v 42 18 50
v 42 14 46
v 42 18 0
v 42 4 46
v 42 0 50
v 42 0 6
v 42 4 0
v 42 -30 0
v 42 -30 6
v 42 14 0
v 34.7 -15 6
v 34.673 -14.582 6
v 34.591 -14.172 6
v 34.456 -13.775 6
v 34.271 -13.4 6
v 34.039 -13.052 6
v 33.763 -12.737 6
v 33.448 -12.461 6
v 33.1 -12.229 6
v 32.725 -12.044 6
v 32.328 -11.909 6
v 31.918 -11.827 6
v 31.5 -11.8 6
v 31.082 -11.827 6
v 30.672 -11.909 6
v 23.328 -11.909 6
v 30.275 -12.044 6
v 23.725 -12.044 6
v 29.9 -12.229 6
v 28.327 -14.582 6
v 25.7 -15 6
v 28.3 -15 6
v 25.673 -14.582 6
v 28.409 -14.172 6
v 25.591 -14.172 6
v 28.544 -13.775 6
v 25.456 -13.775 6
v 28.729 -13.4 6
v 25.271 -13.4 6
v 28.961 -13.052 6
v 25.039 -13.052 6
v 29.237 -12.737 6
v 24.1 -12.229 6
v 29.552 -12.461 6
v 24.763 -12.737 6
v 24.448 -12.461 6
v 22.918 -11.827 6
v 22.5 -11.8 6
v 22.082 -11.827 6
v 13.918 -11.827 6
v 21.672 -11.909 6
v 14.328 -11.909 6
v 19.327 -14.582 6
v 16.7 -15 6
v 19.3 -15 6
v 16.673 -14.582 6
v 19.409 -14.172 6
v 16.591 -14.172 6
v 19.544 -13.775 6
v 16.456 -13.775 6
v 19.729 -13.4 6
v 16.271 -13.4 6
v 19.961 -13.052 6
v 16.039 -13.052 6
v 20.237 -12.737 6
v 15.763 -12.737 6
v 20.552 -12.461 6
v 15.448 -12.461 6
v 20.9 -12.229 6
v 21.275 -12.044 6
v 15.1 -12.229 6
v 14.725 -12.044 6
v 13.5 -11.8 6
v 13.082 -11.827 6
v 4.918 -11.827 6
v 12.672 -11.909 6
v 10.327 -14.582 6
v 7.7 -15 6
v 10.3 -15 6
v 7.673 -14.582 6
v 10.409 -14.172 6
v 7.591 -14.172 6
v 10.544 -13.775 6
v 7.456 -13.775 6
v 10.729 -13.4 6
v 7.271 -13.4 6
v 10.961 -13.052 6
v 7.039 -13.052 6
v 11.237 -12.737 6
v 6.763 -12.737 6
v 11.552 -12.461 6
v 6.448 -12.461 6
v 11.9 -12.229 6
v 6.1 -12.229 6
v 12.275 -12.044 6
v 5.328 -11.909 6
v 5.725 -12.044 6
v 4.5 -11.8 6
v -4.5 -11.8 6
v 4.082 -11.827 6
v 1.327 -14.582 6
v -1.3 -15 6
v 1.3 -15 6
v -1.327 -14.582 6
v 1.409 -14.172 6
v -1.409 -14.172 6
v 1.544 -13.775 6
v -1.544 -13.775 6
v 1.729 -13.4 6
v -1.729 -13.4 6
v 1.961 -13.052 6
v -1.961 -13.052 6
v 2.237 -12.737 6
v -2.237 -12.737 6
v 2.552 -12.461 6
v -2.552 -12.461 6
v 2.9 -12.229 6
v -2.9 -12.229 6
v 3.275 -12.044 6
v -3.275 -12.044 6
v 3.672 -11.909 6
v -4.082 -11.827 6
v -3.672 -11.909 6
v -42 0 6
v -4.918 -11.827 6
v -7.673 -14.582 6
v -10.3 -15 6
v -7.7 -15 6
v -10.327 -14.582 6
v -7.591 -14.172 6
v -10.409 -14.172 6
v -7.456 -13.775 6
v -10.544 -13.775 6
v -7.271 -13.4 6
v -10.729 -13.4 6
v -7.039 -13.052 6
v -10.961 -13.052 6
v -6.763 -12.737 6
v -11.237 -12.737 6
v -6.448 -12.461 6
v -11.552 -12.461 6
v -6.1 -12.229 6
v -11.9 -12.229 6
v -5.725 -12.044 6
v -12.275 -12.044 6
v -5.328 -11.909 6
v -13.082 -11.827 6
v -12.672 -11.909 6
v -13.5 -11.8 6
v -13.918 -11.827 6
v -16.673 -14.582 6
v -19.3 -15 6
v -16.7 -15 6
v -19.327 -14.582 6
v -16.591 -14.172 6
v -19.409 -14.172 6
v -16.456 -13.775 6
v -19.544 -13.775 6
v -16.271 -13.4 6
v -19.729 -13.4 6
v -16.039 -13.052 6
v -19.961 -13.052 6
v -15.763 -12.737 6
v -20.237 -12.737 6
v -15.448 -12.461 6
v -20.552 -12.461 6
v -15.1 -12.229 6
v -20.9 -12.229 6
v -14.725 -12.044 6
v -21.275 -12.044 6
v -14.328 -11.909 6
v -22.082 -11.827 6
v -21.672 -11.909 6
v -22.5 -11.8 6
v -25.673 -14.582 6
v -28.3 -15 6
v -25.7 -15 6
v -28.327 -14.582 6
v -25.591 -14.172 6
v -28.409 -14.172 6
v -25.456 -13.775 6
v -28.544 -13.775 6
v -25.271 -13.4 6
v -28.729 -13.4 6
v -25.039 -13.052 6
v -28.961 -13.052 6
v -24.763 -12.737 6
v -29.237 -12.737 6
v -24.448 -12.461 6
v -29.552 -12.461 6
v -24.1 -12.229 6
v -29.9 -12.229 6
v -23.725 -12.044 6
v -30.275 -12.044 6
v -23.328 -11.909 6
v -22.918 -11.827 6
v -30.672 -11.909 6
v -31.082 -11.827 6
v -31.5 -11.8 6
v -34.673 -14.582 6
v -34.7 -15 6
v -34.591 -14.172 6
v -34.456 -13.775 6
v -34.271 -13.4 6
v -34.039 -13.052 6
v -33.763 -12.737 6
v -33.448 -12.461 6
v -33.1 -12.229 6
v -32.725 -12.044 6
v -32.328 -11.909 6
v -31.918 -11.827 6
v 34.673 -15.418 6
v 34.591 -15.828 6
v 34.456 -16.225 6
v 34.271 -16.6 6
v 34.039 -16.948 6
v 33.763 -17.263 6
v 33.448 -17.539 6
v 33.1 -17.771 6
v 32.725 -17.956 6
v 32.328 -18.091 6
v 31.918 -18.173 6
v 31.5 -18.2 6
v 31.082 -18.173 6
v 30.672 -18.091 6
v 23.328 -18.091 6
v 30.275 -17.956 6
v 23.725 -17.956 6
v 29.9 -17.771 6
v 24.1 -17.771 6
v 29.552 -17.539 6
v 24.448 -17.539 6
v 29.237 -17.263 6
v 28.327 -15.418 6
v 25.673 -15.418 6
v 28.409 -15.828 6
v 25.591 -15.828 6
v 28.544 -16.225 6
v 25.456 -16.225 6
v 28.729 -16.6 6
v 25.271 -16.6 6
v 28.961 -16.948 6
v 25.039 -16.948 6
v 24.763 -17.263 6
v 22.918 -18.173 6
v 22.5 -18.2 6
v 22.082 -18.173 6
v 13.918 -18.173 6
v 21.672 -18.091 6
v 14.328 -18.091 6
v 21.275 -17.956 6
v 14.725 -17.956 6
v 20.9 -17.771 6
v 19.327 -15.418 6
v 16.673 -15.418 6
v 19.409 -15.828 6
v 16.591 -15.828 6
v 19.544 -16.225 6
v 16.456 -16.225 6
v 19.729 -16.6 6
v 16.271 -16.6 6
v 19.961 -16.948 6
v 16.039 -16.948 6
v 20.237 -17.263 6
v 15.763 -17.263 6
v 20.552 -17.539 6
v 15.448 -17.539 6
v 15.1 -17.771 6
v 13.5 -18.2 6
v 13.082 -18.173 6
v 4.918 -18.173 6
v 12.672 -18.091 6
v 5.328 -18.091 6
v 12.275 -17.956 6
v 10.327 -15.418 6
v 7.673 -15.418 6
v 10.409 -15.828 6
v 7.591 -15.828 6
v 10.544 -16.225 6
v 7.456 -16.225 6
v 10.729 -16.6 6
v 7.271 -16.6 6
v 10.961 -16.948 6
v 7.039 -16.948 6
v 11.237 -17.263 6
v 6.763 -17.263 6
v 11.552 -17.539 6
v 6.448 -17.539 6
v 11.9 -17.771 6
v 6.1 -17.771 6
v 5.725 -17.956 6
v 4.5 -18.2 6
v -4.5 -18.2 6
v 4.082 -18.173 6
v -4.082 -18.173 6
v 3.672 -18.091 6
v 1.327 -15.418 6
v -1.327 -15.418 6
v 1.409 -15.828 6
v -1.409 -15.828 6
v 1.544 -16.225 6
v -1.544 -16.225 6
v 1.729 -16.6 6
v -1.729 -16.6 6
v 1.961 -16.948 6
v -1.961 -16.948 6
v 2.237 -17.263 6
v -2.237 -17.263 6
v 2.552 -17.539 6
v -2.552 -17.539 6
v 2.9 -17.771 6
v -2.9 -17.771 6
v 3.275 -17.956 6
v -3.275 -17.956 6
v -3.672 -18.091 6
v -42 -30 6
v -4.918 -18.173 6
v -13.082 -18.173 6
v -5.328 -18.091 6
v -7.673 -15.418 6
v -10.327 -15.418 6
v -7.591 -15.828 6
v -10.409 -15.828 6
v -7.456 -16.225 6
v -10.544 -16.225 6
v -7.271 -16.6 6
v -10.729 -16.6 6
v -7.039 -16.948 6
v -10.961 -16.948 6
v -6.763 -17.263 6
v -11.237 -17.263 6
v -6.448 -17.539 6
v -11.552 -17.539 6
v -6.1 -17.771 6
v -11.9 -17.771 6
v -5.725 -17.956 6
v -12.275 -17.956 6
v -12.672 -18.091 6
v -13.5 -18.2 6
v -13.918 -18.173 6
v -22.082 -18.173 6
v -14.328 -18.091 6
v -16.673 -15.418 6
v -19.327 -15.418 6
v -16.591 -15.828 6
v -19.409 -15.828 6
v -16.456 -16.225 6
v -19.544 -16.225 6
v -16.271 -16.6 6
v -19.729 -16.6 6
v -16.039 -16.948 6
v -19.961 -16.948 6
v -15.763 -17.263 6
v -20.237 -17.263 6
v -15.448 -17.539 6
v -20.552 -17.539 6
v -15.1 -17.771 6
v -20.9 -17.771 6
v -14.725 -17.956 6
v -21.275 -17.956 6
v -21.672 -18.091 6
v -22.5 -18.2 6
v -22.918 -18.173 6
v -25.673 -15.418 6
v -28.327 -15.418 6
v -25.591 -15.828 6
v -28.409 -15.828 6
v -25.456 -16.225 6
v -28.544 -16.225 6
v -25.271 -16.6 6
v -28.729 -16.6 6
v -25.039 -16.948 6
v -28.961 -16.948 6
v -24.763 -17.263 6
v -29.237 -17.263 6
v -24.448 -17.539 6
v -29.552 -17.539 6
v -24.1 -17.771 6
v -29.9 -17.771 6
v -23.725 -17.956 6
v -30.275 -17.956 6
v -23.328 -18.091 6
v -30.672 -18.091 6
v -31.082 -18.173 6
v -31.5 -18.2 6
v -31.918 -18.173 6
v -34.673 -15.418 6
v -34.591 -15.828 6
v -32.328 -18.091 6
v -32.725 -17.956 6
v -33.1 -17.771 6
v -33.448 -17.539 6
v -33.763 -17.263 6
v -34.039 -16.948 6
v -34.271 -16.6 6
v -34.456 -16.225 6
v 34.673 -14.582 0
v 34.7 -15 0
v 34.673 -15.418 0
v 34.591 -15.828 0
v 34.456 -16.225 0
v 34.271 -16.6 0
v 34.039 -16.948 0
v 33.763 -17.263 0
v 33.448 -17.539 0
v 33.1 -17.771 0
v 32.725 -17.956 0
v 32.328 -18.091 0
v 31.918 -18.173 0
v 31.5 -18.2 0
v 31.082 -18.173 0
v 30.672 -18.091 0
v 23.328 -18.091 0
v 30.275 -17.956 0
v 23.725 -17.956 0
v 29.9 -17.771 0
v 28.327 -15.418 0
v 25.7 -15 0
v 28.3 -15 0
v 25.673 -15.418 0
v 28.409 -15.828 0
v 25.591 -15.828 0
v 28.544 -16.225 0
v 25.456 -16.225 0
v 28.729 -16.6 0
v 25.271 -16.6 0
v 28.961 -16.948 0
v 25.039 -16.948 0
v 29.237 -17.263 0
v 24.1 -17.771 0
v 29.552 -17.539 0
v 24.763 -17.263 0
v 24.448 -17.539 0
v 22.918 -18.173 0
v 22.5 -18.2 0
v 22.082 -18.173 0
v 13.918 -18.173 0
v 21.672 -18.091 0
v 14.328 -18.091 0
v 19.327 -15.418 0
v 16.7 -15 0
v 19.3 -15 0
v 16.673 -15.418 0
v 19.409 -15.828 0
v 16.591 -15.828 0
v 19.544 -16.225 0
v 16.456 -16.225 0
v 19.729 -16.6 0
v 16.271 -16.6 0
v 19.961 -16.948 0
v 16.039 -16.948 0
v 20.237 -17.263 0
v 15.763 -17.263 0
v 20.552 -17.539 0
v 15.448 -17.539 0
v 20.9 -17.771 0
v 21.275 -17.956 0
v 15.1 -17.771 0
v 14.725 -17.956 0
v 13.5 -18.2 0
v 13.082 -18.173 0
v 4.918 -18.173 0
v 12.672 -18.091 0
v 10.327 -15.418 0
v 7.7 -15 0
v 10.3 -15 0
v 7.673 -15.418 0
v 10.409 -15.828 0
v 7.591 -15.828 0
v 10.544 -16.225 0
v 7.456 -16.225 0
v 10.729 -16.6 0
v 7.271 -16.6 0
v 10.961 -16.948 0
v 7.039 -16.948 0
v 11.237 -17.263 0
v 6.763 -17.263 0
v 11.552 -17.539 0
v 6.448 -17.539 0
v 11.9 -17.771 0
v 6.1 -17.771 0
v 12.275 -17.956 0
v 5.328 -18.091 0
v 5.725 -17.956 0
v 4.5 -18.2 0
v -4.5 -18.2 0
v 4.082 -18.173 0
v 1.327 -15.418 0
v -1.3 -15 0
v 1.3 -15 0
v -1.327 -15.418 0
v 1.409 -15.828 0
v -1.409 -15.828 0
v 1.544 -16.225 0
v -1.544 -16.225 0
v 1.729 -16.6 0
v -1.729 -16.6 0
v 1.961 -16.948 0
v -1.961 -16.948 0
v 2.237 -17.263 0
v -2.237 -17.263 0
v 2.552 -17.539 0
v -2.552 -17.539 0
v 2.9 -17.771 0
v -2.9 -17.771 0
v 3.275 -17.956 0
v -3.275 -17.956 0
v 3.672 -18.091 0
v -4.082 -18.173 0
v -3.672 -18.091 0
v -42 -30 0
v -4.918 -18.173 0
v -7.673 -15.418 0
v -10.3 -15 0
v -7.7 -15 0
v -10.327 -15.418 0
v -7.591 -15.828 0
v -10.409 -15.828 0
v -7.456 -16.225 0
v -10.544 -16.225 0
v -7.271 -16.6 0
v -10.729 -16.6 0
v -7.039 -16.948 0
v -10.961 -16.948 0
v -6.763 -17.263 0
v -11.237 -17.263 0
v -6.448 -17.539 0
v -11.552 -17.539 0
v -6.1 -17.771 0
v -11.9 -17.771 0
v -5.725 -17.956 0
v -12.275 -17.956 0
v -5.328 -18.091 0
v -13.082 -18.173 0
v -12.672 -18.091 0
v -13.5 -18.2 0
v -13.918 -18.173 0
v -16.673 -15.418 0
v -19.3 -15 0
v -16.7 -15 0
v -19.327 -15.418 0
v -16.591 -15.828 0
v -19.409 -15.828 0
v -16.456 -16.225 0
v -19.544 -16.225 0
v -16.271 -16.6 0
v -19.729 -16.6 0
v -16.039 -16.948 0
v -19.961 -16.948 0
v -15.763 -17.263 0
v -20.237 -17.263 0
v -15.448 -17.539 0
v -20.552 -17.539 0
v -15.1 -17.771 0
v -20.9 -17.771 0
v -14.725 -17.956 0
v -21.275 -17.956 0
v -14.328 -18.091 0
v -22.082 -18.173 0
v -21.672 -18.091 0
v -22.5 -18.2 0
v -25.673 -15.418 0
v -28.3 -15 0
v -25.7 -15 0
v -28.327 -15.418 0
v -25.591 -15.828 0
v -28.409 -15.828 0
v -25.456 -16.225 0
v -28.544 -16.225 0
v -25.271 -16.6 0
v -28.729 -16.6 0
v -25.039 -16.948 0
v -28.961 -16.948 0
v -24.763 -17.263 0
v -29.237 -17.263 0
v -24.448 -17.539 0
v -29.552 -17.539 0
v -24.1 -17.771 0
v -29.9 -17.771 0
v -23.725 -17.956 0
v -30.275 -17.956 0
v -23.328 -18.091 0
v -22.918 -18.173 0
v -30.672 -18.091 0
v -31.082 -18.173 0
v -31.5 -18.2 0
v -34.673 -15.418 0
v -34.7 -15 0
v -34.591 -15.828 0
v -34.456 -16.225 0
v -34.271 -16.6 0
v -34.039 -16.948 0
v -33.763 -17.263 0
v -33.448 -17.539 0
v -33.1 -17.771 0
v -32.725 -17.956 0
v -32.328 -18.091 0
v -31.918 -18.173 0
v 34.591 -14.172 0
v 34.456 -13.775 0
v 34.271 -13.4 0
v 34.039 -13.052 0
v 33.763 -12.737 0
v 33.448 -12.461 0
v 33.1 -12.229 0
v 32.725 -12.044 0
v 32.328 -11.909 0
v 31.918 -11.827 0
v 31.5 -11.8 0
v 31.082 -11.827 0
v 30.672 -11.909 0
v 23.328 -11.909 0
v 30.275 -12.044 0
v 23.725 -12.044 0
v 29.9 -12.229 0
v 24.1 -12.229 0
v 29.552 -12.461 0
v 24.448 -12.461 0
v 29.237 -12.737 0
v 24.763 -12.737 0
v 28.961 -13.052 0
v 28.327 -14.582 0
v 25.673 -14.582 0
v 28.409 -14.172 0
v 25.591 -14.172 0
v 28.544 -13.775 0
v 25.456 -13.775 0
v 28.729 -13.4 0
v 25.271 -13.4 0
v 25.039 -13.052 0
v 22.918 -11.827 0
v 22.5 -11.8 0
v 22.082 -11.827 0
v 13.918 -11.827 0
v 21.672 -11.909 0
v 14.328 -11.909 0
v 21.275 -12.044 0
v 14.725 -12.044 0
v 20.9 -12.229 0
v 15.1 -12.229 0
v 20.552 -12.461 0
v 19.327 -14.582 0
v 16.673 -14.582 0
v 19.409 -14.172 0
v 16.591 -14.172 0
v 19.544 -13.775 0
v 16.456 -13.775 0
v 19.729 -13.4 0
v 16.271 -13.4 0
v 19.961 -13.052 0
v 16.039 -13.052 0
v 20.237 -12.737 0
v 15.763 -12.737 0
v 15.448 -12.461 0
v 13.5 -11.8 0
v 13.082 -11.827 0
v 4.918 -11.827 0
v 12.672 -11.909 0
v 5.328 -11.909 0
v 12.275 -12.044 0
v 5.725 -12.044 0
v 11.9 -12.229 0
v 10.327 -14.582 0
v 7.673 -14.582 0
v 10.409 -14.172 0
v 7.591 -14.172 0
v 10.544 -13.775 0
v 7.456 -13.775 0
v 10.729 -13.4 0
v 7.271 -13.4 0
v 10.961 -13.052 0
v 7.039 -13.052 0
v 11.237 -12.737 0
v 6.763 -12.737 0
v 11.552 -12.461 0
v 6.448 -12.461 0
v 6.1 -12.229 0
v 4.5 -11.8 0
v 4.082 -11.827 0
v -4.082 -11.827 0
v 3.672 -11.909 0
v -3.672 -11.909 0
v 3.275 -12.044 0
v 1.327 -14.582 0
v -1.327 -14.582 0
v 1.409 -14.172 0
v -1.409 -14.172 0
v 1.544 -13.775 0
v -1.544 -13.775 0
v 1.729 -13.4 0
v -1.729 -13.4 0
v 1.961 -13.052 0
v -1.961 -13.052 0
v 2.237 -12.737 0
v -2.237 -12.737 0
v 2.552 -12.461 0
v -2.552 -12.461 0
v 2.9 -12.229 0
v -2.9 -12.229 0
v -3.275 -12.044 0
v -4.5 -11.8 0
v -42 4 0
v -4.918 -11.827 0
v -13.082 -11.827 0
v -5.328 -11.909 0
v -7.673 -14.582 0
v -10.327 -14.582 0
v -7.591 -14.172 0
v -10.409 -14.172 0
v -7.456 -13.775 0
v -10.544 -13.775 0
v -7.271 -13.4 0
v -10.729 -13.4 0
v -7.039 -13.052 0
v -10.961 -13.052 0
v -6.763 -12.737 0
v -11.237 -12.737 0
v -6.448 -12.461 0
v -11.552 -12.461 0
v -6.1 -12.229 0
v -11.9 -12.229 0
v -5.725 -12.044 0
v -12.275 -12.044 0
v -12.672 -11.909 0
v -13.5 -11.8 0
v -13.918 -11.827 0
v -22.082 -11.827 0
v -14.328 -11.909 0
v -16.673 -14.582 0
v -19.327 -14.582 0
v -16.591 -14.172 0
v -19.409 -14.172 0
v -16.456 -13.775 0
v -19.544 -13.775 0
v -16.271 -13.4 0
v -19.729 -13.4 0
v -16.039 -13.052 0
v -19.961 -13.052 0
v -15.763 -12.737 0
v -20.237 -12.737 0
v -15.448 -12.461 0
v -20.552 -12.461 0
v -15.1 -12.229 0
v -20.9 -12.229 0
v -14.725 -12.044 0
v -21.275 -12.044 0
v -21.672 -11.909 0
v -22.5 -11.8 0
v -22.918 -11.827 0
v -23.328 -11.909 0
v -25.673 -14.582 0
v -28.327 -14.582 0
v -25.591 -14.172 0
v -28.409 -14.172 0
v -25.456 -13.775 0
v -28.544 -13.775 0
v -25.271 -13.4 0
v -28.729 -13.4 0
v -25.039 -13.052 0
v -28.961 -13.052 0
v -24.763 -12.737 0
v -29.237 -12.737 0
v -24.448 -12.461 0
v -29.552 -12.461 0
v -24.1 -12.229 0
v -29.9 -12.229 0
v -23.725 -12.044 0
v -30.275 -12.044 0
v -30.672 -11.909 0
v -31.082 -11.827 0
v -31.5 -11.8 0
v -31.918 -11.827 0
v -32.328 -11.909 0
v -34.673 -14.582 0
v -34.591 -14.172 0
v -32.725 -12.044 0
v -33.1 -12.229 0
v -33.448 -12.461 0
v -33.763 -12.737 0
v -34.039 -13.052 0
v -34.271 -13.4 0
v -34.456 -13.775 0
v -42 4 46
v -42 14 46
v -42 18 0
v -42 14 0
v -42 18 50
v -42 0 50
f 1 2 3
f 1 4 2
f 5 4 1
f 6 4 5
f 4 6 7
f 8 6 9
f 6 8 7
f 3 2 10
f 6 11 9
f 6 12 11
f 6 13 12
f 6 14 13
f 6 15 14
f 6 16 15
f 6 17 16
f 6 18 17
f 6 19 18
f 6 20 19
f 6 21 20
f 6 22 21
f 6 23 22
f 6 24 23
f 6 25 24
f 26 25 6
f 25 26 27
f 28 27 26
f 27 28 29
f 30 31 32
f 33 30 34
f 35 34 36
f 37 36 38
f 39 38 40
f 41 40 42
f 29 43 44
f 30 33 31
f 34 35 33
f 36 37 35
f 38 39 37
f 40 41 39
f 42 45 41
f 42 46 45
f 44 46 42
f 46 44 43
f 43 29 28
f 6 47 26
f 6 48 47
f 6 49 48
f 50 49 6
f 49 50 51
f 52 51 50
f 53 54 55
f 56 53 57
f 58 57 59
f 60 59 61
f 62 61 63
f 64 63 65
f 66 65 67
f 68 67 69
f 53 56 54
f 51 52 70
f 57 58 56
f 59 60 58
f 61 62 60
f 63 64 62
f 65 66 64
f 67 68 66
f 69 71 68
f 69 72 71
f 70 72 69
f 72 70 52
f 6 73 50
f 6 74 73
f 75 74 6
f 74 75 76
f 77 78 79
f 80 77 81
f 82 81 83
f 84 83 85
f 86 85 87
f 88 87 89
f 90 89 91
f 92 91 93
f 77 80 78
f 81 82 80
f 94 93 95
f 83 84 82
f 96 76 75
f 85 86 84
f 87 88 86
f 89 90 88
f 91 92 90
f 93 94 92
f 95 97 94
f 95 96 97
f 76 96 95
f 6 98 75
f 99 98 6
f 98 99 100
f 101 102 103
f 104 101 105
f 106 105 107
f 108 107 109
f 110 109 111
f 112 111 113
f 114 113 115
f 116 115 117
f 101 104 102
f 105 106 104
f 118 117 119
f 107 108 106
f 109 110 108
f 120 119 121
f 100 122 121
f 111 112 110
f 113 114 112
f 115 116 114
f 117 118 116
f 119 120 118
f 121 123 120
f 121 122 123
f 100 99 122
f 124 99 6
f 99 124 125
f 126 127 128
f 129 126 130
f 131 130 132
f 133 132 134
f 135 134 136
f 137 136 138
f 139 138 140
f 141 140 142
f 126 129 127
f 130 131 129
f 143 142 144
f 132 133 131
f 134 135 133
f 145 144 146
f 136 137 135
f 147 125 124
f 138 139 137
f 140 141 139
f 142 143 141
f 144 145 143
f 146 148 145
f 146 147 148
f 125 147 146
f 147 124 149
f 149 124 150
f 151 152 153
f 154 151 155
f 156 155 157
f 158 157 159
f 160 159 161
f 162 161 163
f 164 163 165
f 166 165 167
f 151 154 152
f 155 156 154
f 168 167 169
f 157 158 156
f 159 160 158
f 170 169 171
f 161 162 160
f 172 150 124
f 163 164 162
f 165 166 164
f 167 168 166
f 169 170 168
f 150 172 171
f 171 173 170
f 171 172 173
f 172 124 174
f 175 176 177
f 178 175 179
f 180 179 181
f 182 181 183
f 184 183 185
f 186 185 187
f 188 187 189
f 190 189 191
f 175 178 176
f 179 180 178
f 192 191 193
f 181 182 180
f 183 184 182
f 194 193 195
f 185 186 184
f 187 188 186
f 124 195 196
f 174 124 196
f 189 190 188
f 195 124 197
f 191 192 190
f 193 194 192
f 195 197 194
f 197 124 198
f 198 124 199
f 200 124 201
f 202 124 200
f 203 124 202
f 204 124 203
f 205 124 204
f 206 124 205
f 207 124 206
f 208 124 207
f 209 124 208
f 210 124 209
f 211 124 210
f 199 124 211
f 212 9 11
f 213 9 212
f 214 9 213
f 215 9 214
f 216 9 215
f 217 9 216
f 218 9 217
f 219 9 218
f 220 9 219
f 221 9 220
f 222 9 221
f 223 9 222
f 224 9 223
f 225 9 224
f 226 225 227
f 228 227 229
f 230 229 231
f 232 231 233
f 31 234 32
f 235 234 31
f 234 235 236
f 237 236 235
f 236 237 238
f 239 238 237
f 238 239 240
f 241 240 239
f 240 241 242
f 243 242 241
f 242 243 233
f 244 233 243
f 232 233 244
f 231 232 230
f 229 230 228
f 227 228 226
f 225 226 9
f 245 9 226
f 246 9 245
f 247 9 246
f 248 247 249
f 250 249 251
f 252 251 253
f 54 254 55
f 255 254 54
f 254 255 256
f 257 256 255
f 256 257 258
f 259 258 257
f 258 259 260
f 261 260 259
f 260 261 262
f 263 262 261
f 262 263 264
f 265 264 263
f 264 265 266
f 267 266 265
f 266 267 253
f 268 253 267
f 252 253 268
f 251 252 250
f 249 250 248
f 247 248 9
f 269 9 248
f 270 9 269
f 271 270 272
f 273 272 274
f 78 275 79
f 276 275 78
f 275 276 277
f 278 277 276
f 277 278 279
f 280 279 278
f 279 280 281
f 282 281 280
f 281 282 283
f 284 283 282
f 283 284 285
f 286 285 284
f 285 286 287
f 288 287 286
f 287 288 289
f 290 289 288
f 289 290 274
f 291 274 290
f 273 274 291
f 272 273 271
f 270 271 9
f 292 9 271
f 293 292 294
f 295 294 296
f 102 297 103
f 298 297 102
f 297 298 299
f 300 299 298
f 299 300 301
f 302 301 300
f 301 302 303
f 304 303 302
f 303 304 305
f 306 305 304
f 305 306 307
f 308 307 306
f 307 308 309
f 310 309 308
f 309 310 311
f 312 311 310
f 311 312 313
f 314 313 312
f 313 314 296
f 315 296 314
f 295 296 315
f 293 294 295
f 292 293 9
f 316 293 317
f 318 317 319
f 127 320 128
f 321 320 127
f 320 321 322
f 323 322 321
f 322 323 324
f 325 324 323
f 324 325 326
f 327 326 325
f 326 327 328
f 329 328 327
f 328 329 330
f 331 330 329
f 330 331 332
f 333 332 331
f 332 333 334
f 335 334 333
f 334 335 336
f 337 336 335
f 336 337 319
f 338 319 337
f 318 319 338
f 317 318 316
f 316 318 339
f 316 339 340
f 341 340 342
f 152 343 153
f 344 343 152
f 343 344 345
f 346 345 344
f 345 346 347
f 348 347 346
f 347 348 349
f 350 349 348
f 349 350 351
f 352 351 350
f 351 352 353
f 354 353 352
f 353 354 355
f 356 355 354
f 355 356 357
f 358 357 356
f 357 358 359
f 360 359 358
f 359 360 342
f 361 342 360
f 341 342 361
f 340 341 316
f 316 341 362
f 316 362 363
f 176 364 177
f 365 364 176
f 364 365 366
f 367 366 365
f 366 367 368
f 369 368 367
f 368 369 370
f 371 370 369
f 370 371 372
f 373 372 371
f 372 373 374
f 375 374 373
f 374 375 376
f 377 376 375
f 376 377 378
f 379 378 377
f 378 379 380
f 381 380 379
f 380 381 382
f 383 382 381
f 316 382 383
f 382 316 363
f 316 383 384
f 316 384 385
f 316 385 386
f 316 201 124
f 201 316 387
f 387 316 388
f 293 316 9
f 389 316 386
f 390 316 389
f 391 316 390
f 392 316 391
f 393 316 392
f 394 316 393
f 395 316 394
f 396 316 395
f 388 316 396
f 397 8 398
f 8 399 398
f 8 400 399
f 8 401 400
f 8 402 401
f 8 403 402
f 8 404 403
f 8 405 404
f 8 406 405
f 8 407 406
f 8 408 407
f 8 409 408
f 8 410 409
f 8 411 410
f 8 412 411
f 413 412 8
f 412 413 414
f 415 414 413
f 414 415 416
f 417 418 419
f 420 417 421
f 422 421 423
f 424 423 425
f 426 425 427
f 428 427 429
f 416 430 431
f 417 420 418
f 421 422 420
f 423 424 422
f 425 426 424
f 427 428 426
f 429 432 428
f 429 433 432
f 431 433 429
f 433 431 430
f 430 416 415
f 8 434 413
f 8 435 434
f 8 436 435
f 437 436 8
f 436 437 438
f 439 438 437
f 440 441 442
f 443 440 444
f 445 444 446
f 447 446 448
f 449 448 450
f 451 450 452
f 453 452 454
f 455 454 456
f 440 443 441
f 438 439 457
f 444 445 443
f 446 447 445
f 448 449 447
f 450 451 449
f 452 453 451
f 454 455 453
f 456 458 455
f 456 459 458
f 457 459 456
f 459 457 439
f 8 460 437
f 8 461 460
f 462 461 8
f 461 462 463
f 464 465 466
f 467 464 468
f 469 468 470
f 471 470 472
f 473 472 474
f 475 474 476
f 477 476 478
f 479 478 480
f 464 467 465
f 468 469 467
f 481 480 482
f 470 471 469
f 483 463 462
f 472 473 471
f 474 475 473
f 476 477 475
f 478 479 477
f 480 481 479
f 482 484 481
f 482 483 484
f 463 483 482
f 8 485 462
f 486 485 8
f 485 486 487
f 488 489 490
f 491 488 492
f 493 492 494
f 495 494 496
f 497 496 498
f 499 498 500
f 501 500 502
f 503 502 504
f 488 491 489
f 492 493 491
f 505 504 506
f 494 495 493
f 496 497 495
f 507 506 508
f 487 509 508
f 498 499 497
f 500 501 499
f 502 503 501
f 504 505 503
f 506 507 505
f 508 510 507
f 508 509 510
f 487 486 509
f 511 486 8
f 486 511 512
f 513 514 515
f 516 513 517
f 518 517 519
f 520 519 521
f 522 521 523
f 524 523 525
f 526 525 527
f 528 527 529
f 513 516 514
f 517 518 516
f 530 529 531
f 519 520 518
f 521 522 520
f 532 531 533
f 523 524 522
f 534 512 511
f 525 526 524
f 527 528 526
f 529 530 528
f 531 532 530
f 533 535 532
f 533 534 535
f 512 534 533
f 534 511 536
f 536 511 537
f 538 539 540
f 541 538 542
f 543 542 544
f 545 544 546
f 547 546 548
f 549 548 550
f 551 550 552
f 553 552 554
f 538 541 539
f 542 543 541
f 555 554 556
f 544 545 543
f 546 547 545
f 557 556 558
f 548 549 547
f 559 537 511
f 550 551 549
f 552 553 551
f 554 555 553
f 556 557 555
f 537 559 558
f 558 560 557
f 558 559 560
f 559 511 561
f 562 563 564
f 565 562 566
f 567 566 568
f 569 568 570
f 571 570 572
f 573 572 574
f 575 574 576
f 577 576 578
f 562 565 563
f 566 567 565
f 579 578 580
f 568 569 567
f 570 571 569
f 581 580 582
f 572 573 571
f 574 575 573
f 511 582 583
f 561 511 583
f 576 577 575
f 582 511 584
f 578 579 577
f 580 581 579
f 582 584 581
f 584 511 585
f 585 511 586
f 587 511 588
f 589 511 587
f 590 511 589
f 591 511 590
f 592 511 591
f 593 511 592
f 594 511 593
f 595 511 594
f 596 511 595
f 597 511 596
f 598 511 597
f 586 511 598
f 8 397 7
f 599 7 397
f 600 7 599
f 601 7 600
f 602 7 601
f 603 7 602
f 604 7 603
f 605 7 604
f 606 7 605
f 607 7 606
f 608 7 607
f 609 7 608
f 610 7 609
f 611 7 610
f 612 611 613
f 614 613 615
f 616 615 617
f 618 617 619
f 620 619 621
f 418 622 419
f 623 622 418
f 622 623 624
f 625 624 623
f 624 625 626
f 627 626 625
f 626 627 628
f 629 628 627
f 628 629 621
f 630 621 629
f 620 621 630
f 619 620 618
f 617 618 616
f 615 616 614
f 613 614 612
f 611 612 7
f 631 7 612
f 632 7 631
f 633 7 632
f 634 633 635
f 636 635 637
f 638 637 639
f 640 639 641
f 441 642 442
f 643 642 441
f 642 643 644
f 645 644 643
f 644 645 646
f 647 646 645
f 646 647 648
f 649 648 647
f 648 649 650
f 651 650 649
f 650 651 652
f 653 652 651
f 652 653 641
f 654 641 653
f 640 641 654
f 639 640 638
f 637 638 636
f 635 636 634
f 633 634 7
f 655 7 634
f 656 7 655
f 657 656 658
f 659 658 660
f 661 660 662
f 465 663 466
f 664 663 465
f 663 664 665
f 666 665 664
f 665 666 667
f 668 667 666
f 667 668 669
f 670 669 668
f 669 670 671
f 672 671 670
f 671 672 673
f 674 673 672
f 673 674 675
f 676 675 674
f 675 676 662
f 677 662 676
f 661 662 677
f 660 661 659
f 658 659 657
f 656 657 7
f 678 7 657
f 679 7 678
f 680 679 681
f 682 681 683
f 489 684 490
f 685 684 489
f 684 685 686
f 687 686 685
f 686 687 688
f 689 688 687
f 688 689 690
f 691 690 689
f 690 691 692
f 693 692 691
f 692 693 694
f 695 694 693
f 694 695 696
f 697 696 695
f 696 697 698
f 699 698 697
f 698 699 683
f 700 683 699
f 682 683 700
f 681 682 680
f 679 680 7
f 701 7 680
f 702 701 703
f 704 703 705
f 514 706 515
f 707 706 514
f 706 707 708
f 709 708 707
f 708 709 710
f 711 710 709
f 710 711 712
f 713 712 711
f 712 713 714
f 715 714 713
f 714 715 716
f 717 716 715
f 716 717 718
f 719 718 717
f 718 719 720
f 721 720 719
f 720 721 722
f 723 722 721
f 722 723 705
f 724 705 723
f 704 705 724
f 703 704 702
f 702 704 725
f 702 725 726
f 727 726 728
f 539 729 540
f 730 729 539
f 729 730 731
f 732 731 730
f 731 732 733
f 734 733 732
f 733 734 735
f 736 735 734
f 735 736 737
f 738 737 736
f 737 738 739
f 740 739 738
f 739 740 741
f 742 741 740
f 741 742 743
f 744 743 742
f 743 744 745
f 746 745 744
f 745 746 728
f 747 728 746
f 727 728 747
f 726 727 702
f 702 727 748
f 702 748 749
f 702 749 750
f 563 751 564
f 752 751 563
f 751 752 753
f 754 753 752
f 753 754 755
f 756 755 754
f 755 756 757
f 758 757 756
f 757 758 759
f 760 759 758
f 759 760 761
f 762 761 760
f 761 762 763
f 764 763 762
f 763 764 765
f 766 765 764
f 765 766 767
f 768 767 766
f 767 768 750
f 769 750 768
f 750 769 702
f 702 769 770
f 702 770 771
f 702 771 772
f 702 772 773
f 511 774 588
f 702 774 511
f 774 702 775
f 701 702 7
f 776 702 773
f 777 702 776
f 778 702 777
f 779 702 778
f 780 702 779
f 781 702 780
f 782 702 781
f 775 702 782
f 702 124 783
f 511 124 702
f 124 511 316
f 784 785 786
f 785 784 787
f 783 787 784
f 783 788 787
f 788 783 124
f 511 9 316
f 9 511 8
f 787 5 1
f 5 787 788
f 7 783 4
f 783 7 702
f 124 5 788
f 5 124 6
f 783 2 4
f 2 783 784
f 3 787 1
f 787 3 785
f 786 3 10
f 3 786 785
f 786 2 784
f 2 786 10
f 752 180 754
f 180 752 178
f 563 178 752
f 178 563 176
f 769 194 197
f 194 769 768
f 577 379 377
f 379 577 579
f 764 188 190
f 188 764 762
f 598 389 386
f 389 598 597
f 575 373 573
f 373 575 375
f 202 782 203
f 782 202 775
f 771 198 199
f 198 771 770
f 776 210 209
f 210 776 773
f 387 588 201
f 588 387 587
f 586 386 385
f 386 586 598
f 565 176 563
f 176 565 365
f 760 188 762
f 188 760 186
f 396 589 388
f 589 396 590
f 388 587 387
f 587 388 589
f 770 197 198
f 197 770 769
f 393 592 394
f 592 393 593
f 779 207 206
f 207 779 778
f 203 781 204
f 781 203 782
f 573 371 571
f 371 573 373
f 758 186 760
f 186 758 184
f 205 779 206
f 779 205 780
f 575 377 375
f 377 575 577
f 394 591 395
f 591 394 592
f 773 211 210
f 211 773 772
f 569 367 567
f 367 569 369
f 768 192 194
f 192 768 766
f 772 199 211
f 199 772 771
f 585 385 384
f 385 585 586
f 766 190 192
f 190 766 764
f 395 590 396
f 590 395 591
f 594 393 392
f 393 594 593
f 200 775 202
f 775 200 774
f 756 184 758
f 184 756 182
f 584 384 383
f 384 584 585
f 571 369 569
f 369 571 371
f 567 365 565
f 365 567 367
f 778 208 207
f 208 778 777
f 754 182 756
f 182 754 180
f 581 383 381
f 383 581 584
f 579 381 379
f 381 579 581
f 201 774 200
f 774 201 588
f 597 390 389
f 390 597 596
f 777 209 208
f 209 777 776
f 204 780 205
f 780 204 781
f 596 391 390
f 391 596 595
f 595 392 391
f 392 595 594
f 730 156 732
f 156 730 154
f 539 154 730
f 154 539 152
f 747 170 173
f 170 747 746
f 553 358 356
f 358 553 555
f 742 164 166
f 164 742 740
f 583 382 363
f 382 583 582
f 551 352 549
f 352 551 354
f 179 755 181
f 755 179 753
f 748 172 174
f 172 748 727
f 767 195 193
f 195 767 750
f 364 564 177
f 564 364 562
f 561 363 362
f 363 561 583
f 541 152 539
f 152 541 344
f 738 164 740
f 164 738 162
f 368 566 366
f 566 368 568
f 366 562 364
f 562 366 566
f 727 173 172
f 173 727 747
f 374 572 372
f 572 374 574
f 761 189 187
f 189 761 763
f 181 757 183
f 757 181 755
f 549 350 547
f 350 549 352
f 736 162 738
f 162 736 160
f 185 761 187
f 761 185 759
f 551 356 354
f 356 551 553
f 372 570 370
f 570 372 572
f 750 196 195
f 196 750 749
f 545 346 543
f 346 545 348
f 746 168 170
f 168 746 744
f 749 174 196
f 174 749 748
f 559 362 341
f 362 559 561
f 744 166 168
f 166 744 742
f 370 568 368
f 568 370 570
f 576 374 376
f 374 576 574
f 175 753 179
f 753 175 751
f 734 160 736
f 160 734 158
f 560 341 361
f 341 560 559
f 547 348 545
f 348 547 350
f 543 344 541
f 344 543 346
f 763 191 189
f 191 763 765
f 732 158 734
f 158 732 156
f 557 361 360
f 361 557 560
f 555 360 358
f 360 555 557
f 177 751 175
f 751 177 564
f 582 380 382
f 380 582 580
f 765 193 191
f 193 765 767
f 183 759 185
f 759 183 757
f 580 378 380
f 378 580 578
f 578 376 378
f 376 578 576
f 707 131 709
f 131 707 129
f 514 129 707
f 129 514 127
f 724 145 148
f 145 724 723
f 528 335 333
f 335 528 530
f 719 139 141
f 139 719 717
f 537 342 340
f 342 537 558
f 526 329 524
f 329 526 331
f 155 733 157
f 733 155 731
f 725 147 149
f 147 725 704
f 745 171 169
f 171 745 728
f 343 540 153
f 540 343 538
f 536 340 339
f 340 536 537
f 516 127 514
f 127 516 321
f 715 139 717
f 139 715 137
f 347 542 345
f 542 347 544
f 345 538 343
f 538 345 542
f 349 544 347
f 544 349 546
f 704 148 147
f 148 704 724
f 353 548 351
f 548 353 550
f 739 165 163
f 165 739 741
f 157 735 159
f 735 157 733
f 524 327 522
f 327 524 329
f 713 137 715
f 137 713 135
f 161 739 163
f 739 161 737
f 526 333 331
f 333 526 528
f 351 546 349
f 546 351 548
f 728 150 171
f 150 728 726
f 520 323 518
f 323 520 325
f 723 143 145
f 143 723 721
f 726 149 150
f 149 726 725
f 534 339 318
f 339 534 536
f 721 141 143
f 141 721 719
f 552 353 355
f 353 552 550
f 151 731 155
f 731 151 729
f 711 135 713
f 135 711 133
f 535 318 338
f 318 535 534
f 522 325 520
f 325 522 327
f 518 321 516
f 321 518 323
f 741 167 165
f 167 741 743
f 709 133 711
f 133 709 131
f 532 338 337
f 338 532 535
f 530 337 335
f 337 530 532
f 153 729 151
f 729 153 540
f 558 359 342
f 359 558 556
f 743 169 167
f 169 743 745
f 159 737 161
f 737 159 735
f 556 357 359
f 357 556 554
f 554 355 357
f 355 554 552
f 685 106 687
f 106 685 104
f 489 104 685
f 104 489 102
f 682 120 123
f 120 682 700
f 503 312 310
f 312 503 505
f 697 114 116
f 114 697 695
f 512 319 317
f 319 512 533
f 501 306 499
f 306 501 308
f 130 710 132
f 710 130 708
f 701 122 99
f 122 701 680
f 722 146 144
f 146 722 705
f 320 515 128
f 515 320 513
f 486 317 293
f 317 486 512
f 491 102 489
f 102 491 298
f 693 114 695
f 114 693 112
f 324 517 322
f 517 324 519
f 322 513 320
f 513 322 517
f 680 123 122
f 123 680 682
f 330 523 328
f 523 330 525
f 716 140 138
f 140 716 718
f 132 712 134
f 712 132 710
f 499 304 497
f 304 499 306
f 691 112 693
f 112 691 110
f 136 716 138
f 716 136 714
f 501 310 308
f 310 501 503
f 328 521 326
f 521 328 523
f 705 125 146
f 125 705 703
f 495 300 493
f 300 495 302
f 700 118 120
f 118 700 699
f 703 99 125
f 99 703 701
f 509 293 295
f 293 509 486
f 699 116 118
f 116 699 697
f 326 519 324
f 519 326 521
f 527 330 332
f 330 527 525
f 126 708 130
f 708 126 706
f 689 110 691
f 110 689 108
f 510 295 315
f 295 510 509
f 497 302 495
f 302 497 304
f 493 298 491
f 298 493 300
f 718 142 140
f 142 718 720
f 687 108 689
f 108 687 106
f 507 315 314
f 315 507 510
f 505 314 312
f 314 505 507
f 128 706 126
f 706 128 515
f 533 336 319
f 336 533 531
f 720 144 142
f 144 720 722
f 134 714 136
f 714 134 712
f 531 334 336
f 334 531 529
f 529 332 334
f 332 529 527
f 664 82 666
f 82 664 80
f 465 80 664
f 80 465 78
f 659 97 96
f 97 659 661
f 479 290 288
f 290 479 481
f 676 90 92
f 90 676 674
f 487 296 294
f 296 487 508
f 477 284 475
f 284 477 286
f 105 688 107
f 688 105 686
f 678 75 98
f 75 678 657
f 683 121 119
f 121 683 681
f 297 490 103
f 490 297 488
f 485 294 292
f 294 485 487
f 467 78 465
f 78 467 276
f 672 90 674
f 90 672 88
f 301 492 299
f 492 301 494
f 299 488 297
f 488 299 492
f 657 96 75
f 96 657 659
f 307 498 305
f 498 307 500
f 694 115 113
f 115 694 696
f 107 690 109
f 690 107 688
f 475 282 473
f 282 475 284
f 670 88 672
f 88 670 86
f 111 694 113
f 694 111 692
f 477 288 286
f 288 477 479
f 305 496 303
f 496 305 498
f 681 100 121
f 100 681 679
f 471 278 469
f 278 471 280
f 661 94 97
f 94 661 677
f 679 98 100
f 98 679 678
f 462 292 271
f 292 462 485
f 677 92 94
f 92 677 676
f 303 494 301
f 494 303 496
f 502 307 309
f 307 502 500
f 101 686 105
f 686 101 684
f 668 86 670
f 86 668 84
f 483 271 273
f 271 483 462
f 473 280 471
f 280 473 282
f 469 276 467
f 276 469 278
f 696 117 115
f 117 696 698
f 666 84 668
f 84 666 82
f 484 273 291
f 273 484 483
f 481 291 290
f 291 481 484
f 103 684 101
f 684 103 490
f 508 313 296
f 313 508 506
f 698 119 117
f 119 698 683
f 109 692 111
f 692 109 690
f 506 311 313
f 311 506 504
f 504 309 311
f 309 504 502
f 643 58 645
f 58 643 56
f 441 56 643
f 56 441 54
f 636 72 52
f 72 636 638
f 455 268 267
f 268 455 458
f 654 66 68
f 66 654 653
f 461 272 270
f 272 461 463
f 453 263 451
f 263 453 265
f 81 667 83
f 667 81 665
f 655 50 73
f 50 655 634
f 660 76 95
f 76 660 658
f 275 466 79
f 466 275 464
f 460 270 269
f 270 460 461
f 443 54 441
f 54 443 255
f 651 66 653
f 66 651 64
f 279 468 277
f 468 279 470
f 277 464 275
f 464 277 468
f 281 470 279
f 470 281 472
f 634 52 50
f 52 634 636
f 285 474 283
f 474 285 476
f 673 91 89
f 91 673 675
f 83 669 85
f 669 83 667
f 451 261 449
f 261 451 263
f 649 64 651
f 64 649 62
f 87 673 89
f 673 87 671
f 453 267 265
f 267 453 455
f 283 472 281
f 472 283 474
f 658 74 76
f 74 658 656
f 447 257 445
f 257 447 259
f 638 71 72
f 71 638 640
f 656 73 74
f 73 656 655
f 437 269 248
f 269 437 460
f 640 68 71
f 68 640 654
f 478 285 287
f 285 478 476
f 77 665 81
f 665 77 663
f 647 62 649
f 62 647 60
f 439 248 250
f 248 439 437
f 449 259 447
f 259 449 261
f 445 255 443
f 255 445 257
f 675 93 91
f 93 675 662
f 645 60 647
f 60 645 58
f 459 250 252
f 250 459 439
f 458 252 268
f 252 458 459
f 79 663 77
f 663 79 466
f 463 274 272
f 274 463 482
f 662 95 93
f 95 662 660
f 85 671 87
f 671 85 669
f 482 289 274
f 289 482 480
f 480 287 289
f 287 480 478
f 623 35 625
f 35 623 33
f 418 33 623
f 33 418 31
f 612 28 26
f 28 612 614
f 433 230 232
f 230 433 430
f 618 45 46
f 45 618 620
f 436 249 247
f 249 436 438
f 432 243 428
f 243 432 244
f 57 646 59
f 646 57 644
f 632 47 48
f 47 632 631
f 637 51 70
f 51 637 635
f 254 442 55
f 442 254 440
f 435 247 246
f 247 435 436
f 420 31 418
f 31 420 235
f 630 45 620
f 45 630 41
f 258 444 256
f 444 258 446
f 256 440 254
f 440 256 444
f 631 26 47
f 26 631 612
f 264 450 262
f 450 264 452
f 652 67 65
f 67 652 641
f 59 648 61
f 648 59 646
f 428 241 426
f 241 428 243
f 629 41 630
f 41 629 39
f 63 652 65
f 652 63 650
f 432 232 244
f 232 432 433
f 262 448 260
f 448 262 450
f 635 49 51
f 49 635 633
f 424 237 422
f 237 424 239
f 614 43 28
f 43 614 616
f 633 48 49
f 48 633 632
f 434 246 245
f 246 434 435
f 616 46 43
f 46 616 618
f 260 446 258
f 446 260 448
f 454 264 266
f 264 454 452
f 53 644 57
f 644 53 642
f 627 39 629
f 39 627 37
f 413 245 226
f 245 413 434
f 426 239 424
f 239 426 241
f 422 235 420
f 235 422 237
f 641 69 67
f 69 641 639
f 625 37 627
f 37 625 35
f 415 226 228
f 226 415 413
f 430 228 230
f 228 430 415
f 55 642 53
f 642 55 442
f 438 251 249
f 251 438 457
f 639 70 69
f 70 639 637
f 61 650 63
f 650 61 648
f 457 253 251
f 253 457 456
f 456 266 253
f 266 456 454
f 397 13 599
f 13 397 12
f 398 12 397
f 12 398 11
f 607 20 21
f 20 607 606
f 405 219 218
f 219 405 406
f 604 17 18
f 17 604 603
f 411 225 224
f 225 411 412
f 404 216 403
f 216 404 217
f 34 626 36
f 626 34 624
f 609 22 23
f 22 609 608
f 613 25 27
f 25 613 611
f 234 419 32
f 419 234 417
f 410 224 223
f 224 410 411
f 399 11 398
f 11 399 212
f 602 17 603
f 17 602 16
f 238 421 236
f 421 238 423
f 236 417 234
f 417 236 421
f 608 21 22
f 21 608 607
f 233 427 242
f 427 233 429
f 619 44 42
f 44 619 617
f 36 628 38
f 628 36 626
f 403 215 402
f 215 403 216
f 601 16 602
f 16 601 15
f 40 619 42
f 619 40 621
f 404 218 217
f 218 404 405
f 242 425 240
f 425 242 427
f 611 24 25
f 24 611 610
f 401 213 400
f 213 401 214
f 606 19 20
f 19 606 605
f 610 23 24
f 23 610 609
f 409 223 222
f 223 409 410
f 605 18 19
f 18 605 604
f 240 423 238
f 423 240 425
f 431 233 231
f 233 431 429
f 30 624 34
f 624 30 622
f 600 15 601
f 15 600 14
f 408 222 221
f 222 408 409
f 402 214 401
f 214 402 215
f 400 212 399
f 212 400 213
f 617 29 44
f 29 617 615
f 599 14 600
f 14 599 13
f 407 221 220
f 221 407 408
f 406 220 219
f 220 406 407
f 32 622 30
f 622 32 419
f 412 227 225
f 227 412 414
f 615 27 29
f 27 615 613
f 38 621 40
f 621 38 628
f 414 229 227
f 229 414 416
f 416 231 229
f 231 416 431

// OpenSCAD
// KNOWN-WRONG PART (must fail): the wall gap is 10 mm instead of 12.5
// Holder that hangs one 8-tube PCR strip inside an ice bucket, hooked over its 12 mm wall
// Category: quick fixes. An upside-down U (two legs and a bridge) that fits over the wall, and a
// ledge at the foot of the inner leg with eight tube holes, so the tubes sit down in the ice.
// Print: PLA or PETG, as used (both legs and the ledge on the bed); the bridge spans 12.5 mm.
// SPDX-License-Identifier: CERN-OHL-P-2.0

/* [Hanger] */
length = 84;              // along X, centred
leg_t = 4;
gap = 10;                 // 12 mm bucket wall + clearance
leg_h = 50;               // both legs from z = 0 to 50
bridge_t = 4;             // bridge from z = 46 to 50
ledge = [30, 6];          // ledge reaches 30 mm toward -Y, 6 mm thick
hole_d = 6.4;
n = 8;
pitch = 9;
hole_y = -15;

/* [Hidden] */
eps = 0.01;
outer_y = leg_t + gap;    // outer leg from y = 16.5 to 20.5

difference() {
    union() {
        translate([-length / 2, -ledge[0], 0]) cube([length, ledge[0] + eps, ledge[1]]);
        translate([-length / 2, 0, 0]) cube([length, leg_t, leg_h]);
        translate([-length / 2, 0, leg_h - bridge_t]) cube([length, outer_y + leg_t, bridge_t]);
        translate([-length / 2, outer_y, 0]) cube([length, leg_t, leg_h]);
    }
    for (i = [0 : n - 1])
        translate([(i - (n - 1) / 2) * pitch, hole_y, -1]) cylinder(d = hole_d, h = ledge[1] + 2, $fn = 48);
}
